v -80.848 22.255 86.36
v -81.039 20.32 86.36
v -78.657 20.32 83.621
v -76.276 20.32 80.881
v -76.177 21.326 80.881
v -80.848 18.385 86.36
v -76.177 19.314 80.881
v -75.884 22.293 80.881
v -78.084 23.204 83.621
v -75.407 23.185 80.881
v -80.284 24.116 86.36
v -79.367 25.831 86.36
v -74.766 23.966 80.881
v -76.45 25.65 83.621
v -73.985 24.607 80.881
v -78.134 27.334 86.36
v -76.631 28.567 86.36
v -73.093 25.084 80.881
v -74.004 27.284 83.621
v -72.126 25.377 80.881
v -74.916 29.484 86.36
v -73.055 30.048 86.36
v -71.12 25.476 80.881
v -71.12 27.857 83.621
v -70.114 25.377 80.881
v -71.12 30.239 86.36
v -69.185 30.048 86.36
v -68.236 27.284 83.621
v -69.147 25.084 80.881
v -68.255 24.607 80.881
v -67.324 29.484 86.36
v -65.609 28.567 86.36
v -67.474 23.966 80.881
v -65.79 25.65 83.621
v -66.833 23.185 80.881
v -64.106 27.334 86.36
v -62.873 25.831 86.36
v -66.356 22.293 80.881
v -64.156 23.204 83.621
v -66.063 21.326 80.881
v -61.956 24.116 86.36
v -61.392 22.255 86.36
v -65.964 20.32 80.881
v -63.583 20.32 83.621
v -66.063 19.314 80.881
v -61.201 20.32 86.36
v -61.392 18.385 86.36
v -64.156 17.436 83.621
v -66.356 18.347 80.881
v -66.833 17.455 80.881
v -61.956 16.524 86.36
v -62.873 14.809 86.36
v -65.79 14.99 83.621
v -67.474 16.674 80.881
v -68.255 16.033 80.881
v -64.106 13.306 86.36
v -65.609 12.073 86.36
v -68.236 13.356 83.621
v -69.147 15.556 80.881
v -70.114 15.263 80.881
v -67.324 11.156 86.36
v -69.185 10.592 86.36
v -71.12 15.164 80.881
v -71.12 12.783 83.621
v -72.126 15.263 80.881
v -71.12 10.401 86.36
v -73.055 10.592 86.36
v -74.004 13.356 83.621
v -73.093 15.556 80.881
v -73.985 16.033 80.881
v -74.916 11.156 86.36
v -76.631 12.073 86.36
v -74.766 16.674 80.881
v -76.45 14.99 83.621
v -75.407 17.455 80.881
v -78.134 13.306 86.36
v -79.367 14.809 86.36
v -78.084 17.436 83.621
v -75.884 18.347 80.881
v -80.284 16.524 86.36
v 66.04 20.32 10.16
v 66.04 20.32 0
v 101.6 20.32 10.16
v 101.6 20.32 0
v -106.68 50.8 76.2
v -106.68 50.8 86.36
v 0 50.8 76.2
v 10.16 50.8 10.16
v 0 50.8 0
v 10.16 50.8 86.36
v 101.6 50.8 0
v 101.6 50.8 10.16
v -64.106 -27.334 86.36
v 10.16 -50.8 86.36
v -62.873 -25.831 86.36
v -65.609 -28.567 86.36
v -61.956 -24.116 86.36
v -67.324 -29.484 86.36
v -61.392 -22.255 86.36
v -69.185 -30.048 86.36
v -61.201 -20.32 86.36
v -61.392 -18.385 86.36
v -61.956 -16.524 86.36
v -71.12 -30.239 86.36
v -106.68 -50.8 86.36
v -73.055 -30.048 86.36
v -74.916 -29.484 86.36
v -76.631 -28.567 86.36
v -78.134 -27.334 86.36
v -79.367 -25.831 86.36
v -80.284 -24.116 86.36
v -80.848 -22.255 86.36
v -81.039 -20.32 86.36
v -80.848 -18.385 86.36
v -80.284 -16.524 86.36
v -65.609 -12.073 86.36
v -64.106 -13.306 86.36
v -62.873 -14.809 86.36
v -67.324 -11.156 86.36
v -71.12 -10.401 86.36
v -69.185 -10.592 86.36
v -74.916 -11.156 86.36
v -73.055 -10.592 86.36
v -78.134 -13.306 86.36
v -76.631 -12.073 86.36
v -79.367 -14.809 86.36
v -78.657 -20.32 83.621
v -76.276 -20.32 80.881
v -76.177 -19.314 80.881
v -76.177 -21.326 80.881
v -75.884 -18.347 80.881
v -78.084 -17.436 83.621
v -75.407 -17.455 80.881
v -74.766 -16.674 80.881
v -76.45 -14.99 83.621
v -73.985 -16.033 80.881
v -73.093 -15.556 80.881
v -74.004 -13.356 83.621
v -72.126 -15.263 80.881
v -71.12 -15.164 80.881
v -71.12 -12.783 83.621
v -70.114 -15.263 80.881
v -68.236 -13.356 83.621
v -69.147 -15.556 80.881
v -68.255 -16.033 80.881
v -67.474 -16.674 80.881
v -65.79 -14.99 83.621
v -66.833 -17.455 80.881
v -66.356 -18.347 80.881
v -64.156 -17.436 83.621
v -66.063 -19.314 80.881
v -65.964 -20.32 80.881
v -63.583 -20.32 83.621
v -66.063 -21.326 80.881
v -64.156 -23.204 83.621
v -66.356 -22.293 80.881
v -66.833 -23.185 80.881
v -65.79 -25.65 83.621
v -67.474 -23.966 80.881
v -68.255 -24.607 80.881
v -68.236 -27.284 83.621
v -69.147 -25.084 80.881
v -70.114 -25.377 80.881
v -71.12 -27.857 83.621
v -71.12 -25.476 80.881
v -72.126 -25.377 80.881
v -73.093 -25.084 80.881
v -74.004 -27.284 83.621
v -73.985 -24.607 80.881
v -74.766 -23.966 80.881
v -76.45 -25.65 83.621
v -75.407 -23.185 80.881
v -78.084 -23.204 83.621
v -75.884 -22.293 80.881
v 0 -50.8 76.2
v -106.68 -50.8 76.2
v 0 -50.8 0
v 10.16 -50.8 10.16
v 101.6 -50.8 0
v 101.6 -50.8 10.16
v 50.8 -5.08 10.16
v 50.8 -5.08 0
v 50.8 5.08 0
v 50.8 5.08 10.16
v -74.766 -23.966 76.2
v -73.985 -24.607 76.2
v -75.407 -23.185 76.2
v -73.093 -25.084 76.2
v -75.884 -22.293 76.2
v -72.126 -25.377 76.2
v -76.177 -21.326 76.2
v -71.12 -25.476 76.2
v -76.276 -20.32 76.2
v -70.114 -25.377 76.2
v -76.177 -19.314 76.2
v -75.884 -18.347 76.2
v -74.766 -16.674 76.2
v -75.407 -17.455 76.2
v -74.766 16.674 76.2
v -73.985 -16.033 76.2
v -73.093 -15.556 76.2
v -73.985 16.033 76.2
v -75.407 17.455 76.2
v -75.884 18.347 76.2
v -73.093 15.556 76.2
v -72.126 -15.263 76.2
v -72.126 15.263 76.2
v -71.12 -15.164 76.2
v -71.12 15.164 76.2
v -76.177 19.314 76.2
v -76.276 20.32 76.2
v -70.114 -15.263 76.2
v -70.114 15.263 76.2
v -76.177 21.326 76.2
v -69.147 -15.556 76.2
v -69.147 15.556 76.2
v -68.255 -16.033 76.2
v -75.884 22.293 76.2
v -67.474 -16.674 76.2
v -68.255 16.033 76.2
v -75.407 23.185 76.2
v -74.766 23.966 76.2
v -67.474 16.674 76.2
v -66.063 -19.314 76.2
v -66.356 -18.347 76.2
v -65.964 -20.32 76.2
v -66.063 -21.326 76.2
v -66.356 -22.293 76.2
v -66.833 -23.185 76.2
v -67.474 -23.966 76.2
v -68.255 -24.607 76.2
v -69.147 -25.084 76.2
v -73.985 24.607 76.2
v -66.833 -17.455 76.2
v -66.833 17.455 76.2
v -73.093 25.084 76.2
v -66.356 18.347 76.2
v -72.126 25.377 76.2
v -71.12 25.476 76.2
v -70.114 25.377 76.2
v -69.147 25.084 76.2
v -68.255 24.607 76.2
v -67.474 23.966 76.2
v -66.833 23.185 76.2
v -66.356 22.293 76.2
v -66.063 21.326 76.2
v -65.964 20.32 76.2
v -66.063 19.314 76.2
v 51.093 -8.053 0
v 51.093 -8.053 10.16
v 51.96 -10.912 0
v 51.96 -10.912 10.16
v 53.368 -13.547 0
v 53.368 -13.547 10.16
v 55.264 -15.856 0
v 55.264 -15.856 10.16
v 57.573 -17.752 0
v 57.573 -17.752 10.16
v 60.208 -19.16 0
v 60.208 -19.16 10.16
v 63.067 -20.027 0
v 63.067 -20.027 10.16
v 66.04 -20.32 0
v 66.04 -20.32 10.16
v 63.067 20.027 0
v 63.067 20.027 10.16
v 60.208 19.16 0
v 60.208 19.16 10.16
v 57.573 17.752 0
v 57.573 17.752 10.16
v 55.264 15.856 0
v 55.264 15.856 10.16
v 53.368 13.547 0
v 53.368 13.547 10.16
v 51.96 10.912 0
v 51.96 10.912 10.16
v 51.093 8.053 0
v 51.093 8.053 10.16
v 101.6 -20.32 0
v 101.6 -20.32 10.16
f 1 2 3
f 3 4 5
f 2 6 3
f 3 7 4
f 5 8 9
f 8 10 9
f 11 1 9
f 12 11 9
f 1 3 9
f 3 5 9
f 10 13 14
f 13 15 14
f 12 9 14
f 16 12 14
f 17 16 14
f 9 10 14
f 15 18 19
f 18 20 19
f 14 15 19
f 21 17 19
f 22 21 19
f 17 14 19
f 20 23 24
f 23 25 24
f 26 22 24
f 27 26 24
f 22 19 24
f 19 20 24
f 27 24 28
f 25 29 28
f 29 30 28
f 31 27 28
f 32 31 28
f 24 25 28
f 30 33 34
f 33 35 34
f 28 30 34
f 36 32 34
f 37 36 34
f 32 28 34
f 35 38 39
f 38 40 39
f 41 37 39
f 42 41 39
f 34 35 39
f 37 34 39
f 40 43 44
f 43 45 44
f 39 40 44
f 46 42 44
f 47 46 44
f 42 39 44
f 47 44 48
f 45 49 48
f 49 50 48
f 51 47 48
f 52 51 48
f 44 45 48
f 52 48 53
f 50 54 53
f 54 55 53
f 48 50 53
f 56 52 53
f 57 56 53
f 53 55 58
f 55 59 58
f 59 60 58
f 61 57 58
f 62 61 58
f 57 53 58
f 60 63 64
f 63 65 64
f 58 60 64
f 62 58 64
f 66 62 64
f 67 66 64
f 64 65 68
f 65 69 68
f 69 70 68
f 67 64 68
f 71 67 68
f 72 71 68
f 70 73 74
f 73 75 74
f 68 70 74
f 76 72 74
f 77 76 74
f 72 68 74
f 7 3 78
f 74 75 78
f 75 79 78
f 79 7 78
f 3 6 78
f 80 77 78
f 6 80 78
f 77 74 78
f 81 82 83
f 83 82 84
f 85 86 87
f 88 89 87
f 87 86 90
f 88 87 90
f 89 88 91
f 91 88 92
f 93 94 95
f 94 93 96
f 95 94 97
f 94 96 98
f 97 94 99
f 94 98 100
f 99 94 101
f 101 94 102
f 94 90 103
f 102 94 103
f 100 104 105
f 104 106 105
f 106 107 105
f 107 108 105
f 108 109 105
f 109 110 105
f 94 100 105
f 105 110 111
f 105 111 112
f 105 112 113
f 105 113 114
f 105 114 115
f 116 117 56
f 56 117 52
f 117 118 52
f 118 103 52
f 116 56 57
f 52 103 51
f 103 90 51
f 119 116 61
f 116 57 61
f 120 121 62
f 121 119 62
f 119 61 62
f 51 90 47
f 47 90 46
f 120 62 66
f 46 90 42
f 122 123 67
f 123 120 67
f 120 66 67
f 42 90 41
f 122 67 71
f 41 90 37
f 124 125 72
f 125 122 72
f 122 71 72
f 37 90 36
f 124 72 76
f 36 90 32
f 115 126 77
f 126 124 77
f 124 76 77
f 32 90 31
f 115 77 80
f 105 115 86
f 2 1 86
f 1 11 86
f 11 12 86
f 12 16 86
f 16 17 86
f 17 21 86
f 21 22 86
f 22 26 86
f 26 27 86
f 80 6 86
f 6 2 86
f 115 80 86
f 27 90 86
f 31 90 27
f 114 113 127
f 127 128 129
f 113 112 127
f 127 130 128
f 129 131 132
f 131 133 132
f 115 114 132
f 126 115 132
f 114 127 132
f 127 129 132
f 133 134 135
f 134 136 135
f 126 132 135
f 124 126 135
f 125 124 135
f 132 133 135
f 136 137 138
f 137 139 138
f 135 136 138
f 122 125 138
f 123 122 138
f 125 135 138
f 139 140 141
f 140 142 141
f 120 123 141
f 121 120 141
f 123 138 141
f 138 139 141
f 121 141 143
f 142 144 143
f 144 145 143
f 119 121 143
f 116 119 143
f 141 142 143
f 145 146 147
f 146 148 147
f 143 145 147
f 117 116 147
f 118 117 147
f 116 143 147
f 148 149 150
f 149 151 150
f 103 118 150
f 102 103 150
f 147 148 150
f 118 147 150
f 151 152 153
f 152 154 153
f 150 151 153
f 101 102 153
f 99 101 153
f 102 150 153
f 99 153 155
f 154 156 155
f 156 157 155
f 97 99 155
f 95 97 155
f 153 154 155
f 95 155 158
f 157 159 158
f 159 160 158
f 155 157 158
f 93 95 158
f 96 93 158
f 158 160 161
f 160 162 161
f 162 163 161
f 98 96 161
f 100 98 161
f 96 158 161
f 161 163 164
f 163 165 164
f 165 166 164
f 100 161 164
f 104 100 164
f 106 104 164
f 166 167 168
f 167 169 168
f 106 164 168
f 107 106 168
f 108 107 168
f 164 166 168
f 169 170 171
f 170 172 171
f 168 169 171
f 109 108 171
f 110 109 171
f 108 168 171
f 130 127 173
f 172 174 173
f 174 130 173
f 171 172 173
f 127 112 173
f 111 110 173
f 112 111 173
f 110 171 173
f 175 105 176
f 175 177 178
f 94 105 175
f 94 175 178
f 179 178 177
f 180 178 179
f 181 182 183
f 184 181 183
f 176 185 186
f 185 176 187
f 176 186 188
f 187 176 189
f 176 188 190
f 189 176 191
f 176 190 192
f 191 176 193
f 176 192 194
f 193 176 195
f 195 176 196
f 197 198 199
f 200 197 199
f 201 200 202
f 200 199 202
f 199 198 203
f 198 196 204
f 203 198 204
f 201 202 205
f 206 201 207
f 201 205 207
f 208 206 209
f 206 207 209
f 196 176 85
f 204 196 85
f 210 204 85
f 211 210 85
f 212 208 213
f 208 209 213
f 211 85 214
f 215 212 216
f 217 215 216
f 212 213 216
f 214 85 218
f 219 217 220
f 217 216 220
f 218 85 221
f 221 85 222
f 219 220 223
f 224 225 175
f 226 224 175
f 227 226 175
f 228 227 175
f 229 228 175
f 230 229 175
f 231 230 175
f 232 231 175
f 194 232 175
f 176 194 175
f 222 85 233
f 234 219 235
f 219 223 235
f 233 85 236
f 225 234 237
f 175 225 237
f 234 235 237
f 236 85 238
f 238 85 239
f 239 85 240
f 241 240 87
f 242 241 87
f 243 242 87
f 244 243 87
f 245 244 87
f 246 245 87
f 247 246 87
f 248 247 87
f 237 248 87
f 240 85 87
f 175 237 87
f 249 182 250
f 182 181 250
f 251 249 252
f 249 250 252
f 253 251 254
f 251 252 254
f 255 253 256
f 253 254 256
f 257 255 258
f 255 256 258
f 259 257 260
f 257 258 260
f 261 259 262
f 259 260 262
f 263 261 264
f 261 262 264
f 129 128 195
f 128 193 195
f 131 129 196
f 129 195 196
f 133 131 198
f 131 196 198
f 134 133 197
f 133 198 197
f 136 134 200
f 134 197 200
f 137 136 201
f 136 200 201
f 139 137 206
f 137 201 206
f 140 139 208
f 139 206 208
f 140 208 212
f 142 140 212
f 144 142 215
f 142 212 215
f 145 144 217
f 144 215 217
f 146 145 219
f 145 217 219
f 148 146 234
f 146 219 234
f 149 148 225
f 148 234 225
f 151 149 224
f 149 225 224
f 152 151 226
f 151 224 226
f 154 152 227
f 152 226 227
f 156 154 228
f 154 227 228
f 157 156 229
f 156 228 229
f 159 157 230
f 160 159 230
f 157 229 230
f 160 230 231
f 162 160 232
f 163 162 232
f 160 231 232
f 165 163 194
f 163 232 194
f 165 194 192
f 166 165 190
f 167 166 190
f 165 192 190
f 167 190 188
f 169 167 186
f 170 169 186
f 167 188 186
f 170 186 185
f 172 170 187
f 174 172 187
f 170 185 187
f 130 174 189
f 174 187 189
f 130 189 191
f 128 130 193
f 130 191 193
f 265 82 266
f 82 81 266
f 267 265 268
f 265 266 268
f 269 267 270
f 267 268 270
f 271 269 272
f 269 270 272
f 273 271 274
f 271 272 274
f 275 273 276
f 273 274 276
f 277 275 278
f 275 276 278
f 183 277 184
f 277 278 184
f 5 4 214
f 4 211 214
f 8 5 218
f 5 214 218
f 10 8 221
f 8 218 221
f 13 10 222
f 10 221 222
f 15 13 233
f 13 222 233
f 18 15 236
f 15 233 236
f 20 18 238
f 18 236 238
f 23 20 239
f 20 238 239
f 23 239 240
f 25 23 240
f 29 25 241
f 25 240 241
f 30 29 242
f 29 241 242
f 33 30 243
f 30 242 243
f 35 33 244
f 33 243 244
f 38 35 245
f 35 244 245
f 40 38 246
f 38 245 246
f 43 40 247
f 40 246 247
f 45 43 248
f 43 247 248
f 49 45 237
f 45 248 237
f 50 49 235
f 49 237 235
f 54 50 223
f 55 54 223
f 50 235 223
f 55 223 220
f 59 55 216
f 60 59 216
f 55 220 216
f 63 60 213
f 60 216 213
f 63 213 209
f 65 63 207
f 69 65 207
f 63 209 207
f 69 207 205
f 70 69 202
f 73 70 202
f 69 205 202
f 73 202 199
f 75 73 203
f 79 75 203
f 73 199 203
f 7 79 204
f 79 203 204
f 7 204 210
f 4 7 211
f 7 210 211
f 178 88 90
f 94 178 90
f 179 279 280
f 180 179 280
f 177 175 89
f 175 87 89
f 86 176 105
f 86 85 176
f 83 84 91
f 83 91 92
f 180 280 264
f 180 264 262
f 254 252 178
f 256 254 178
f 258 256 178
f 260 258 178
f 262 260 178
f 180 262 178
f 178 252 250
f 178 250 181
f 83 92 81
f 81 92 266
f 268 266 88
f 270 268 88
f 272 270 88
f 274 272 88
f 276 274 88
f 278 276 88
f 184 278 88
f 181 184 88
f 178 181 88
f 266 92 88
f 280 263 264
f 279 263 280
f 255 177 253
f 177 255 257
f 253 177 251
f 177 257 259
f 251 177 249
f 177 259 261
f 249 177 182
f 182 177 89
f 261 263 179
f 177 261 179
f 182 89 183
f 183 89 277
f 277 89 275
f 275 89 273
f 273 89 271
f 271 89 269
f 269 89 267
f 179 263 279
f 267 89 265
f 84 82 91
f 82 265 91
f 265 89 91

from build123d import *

# Parameters (mm, degrees)
F0_W           = 106.68
F0_H           = 10.16
F2_DEPTH       = 50.8
F2_DEPTH_BACK  = 50.8
F1_W           = 50.8
F1_H           = 40.64
F4_DEPTH       = 10.16
F5_D           = 10.3124
F5_CSINK_D     = 19.8374
F5_CSINK_ANGLE = 82
F6_R           = 15.24


with BuildPart() as f2:
    # F0 (on Front) → F2 (new body, two sides)
    with BuildSketch(Plane.XZ) as f2_sk:
        Polygon((0, 76.2), (0, 10.16), (10.16, 10.16), (10.16, 86.36), (0, 86.36), align=None)
        Polygon((10.16, 10.16), (0, 10.16), (0, 0), (101.6, 0), (101.6, 10.16), align=None)
        with Locations((-53.34, 81.28)):
            Rectangle(F0_W, F0_H)
    extrude(amount=-F2_DEPTH)
    extrude(f2_sk.sketch, amount=F2_DEPTH_BACK)

    # F1 (on Top) → F4 (cut, through all)
    with BuildSketch(Plane.XY):
        with Locations((76.2, 0)):
            Rectangle(F1_W, F1_H)
    extrude(amount=F4_DEPTH, mode=Mode.SUBTRACT)

    # F5 (through all)
    with Locations(Plane.XY.offset(86.36)):
        with Locations((-71.12, -20.32), (-71.12, 20.32)):
            CounterSinkHole(F5_D / 2, F5_CSINK_D / 2, counter_sink_angle=F5_CSINK_ANGLE)

    # F6
    f6_edges = [f2.edges().sort_by_distance(p)[0] for p in [
        (50.8, 20.32, 5.08),
        (50.8, -20.32, 5.08),
    ]]
    fillet(f6_edges, radius=F6_R)


solid = f2.part
